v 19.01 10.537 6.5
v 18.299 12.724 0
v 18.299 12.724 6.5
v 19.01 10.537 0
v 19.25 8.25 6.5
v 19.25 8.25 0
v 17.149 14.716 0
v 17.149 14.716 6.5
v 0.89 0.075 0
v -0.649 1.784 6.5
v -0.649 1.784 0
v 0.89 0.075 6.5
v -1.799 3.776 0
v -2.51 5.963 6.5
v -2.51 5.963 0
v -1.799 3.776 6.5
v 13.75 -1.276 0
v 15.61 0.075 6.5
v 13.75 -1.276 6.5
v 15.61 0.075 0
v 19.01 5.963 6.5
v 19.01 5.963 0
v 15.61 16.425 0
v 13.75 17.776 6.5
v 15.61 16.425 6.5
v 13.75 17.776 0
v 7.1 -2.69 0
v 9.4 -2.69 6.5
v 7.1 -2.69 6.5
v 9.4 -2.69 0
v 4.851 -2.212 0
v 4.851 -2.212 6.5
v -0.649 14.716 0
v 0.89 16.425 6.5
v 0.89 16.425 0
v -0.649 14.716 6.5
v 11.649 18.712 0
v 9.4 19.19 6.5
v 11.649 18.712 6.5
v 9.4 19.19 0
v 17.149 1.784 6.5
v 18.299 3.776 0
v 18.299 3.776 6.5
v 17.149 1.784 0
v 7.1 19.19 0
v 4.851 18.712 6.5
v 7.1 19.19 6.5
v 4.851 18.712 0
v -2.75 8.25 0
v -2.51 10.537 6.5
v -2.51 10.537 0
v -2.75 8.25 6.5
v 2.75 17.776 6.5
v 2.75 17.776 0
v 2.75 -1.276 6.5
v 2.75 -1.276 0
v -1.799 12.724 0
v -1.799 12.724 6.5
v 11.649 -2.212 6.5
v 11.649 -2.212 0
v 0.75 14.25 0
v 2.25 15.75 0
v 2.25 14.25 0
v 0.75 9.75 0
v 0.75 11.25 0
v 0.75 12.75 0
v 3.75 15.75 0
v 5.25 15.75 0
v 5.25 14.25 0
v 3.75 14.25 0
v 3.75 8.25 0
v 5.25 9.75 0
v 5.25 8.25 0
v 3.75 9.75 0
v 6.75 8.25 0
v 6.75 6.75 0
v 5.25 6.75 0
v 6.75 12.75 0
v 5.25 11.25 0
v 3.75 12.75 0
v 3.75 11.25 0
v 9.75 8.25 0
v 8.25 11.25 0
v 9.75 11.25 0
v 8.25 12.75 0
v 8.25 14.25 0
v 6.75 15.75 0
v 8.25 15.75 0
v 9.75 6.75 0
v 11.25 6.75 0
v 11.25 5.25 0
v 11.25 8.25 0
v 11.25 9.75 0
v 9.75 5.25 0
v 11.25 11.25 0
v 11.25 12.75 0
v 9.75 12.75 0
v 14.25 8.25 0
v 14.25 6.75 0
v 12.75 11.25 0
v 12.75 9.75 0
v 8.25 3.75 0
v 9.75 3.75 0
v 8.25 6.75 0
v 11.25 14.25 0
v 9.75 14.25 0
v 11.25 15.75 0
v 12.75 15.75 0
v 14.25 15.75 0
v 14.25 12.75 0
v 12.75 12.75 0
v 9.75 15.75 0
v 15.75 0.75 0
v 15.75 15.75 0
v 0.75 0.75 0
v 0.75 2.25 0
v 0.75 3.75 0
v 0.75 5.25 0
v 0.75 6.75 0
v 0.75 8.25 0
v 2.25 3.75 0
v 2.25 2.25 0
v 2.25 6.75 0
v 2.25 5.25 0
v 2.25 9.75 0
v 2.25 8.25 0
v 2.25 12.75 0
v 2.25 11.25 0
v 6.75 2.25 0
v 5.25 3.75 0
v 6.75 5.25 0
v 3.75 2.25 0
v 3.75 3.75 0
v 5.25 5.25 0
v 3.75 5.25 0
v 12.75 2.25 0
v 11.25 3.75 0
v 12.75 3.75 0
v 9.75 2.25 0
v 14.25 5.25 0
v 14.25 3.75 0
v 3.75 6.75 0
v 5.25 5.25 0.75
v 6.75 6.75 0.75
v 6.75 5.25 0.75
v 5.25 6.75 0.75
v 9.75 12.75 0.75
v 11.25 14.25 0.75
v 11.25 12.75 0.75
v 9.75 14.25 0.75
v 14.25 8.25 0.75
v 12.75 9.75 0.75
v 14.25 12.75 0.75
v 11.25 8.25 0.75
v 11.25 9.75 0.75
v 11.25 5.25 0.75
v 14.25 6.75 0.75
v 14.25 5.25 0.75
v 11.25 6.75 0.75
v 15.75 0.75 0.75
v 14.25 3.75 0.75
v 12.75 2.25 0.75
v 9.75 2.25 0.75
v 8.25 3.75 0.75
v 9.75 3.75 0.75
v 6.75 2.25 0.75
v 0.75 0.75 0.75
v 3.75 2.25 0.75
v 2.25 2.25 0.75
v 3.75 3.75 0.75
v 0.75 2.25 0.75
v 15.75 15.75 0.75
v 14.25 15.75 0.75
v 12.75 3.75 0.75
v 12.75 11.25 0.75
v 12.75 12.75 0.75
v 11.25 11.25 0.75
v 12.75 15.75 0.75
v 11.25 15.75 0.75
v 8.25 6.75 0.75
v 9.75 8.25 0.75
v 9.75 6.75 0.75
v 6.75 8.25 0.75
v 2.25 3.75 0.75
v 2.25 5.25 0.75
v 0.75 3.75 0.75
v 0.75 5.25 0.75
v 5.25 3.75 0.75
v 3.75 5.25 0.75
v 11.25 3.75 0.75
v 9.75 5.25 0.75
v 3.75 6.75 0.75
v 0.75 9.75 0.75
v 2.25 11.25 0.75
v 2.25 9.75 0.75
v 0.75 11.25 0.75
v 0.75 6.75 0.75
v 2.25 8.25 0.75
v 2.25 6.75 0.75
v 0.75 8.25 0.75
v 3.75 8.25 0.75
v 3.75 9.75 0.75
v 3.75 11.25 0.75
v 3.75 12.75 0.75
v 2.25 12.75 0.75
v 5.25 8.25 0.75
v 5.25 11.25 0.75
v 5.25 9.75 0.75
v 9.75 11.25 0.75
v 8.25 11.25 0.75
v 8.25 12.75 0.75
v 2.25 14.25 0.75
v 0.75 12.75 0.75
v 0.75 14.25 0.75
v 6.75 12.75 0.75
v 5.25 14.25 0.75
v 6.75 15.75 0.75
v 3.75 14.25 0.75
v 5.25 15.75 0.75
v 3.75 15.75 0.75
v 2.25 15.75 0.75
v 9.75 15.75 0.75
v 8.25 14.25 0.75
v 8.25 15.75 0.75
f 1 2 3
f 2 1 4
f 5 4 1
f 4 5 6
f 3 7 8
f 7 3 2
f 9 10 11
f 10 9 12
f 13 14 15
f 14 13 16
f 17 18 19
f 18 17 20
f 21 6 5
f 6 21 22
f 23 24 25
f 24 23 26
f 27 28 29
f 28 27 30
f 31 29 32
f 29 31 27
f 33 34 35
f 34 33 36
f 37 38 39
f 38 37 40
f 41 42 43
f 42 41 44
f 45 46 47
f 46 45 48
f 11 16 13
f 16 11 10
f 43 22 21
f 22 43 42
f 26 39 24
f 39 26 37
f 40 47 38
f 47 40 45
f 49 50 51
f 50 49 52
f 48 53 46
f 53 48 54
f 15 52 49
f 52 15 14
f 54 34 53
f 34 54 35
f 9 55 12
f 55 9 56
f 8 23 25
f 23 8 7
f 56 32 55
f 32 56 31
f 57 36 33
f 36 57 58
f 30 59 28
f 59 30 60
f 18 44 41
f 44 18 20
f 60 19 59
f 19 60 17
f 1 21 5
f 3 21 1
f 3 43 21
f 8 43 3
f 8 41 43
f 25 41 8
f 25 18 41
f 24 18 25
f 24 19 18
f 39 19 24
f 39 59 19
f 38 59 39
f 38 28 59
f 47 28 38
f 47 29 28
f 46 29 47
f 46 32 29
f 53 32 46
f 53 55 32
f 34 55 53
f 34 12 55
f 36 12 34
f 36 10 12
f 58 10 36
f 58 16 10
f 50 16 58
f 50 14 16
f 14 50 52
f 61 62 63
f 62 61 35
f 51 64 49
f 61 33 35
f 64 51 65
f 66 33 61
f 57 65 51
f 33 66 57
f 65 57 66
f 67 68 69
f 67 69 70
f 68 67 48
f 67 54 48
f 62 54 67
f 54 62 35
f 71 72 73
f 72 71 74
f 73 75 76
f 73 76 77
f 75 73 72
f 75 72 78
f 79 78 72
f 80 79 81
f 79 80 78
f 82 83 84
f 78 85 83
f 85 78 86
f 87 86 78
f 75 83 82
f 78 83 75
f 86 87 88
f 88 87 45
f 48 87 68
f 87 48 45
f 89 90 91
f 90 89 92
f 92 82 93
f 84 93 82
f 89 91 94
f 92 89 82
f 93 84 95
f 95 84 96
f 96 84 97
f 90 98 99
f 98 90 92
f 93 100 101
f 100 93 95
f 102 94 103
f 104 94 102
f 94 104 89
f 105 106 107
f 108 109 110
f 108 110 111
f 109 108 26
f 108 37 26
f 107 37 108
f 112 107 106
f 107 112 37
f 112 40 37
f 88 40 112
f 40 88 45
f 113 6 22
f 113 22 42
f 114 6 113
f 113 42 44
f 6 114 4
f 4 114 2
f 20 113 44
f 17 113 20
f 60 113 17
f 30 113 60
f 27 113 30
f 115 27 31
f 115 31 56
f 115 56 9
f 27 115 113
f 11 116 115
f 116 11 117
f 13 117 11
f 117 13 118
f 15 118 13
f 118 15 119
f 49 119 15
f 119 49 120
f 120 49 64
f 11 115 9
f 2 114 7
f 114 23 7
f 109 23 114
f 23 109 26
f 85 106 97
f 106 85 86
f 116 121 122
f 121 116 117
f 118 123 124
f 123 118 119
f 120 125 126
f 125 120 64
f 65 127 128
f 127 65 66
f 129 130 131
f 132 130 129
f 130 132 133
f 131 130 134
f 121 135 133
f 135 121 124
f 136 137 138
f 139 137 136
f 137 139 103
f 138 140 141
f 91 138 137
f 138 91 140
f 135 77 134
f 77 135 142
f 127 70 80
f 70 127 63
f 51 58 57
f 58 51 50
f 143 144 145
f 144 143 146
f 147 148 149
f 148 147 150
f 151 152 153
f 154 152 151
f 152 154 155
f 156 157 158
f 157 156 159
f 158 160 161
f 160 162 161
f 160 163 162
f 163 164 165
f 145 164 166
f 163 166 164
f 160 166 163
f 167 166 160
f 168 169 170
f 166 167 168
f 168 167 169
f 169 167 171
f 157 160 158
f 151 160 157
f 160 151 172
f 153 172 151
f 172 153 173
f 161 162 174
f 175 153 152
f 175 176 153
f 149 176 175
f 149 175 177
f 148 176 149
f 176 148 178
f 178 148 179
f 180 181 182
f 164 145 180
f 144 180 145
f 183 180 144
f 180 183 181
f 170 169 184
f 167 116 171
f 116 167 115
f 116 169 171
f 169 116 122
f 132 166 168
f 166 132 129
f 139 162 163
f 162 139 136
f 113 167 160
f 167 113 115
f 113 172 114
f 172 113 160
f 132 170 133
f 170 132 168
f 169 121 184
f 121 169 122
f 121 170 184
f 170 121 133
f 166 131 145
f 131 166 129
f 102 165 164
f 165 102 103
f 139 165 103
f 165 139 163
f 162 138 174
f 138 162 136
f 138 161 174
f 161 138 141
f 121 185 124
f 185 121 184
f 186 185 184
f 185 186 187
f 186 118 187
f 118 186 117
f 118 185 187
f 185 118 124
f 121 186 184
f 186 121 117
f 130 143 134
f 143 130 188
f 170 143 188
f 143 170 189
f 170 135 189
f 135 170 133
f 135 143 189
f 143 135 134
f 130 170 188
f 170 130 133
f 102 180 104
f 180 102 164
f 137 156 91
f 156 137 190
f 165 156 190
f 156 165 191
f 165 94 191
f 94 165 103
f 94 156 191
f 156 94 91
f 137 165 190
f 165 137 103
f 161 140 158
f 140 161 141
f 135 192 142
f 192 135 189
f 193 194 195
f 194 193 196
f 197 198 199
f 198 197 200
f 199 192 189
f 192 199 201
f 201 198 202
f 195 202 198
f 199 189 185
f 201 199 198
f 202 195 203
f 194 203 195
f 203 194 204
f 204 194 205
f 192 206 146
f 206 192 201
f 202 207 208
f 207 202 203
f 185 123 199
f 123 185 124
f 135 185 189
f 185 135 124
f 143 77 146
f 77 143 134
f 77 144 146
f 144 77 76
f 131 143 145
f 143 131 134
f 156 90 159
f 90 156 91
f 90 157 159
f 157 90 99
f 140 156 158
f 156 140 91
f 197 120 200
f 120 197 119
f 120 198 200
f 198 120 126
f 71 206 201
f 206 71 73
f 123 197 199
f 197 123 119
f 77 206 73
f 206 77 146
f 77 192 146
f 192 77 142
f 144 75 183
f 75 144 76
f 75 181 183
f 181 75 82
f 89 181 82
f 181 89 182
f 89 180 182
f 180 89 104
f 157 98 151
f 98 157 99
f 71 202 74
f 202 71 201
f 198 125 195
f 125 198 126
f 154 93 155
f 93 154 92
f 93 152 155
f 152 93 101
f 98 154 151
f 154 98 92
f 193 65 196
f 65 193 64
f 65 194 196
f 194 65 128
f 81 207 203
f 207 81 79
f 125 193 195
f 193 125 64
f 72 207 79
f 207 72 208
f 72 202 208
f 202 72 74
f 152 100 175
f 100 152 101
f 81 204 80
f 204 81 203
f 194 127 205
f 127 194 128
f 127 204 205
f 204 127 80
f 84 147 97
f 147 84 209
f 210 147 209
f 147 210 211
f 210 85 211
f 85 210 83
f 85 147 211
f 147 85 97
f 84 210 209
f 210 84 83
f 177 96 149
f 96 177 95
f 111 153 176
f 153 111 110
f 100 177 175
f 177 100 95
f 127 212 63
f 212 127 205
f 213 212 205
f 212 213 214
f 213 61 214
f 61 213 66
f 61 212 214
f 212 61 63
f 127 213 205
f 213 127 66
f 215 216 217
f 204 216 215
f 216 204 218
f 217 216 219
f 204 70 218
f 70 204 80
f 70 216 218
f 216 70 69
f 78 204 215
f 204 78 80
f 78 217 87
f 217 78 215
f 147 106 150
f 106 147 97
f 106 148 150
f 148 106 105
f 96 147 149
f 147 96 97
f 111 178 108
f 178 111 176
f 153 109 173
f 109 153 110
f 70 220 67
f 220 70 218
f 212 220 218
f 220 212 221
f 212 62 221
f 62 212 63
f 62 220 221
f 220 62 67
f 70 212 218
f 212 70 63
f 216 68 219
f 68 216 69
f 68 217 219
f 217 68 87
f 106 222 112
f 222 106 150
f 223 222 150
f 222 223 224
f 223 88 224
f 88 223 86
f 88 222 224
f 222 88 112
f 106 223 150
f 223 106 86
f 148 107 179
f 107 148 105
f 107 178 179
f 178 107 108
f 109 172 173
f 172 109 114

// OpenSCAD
rotate([0,0,0])difference(){translate([8.25,8.25,0])  cylinder(r=11,h=6.5, center=false);
translate([1.5,1.5,0])  cube(size = [1.5,1.5,1.5], center = true);
translate([3,1.5,0])  cube(size = [1.5,1.5,1.5], center = true);
translate([4.5,1.5,0])  cube(size = [1.5,1.5,1.5], center = true);
translate([6,1.5,0])  cube(size = [1.5,1.5,1.5], center = true);
translate([7.5,1.5,0])  cube(size = [1.5,1.5,1.5], center = true);
translate([9,1.5,0])  cube(size = [1.5,1.5,1.5], center = true);
translate([10.5,1.5,0])  cube(size = [1.5,1.5,1.5], center = true);
translate([12,1.5,0])  cube(size = [1.5,1.5,1.5], center = true);
translate([13.5,1.5,0])  cube(size = [1.5,1.5,1.5], center = true);
translate([15,1.5,0])  cube(size = [1.5,1.5,1.5], center = true);
translate([15,1.5,0])  cube(size = [1.5,1.5,1.5], center = true);
translate([3,3,0])  cube(size = [1.5,1.5,1.5], center = true);
translate([3,3,0])  cube(size = [1.5,1.5,1.5], center = true);
translate([3,3,0])  cube(size = [1.5,1.5,1.5], center = true);
translate([7.5,3,0])  cube(size = [1.5,1.5,1.5], center = true);
translate([9,3,0])  cube(size = [1.5,1.5,1.5], center = true);
translate([9,3,0])  cube(size = [1.5,1.5,1.5], center = true);
translate([9,3,0])  cube(size = [1.5,1.5,1.5], center = true);
translate([13.5,3,0])  cube(size = [1.5,1.5,1.5], center = true);
translate([15,3,0])  cube(size = [1.5,1.5,1.5], center = true);
translate([1.5,4.5,0])  cube(size = [1.5,1.5,1.5], center = true);
translate([1.5,4.5,0])  cube(size = [1.5,1.5,1.5], center = true);
translate([4.5,4.5,0])  cube(size = [1.5,1.5,1.5], center = true);
translate([4.5,4.5,0])  cube(size = [1.5,1.5,1.5], center = true);
translate([7.5,4.5,0])  cube(size = [1.5,1.5,1.5], center = true);
translate([7.5,4.5,0])  cube(size = [1.5,1.5,1.5], center = true);
translate([10.5,4.5,0])  cube(size = [1.5,1.5,1.5], center = true);
translate([10.5,4.5,0])  cube(size = [1.5,1.5,1.5], center = true);
translate([10.5,4.5,0])  cube(size = [1.5,1.5,1.5], center = true);
translate([15,4.5,0])  cube(size = [1.5,1.5,1.5], center = true);
translate([15,4.5,0])  cube(size = [1.5,1.5,1.5], center = true);
translate([3,6,0])  cube(size = [1.5,1.5,1.5], center = true);
translate([3,6,0])  cube(size = [1.5,1.5,1.5], center = true);
translate([6,6,0])  cube(size = [1.5,1.5,1.5], center = true);
translate([7.5,6,0])  cube(size = [1.5,1.5,1.5], center = true);
translate([7.5,6,0])  cube(size = [1.5,1.5,1.5], center = true);
translate([7.5,6,0])  cube(size = [1.5,1.5,1.5], center = true);
translate([12,6,0])  cube(size = [1.5,1.5,1.5], center = true);
translate([13.5,6,0])  cube(size = [1.5,1.5,1.5], center = true);
translate([15,6,0])  cube(size = [1.5,1.5,1.5], center = true);
translate([1.5,7.5,0])  cube(size = [1.5,1.5,1.5], center = true);
translate([3,7.5,0])  cube(size = [1.5,1.5,1.5], center = true);
translate([4.5,7.5,0])  cube(size = [1.5,1.5,1.5], center = true);
translate([4.5,7.5,0])  cube(size = [1.5,1.5,1.5], center = true);
translate([7.5,7.5,0])  cube(size = [1.5,1.5,1.5], center = true);
translate([9,7.5,0])  cube(size = [1.5,1.5,1.5], center = true);
translate([9,7.5,0])  cube(size = [1.5,1.5,1.5], center = true);
translate([9,7.5,0])  cube(size = [1.5,1.5,1.5], center = true);
translate([9,7.5,0])  cube(size = [1.5,1.5,1.5], center = true);
translate([15,7.5,0])  cube(size = [1.5,1.5,1.5], center = true);
translate([15,7.5,0])  cube(size = [1.5,1.5,1.5], center = true);
translate([3,9,0])  cube(size = [1.5,1.5,1.5], center = true);
translate([3,9,0])  cube(size = [1.5,1.5,1.5], center = true);
translate([3,9,0])  cube(size = [1.5,1.5,1.5], center = true);
translate([3,9,0])  cube(size = [1.5,1.5,1.5], center = true);
translate([3,9,0])  cube(size = [1.5,1.5,1.5], center = true);
translate([3,9,0])  cube(size = [1.5,1.5,1.5], center = true);
translate([12,9,0])  cube(size = [1.5,1.5,1.5], center = true);
translate([13.5,9,0])  cube(size = [1.5,1.5,1.5], center = true);
translate([15,9,0])  cube(size = [1.5,1.5,1.5], center = true);
translate([1.5,10.5,0])  cube(size = [1.5,1.5,1.5], center = true);
translate([3,10.5,0])  cube(size = [1.5,1.5,1.5], center = true);
translate([4.5,10.5,0])  cube(size = [1.5,1.5,1.5], center = true);
translate([4.5,10.5,0])  cube(size = [1.5,1.5,1.5], center = true);
translate([4.5,10.5,0])  cube(size = [1.5,1.5,1.5], center = true);
translate([4.5,10.5,0])  cube(size = [1.5,1.5,1.5], center = true);
translate([4.5,10.5,0])  cube(size = [1.5,1.5,1.5], center = true);
translate([4.5,10.5,0])  cube(size = [1.5,1.5,1.5], center = true);
translate([13.5,10.5,0])  cube(size = [1.5,1.5,1.5], center = true);
translate([15,10.5,0])  cube(size = [1.5,1.5,1.5], center = true);
translate([15,10.5,0])  cube(size = [1.5,1.5,1.5], center = true);
translate([3,12,0])  cube(size = [1.5,1.5,1.5], center = true);
translate([3,12,0])  cube(size = [1.5,1.5,1.5], center = true);
translate([3,12,0])  cube(size = [1.5,1.5,1.5], center = true);
translate([3,12,0])  cube(size = [1.5,1.5,1.5], center = true);
translate([9,12,0])  cube(size = [1.5,1.5,1.5], center = true);
translate([9,12,0])  cube(size = [1.5,1.5,1.5], center = true);
translate([12,12,0])  cube(size = [1.5,1.5,1.5], center = true);
translate([13.5,12,0])  cube(size = [1.5,1.5,1.5], center = true);
translate([15,12,0])  cube(size = [1.5,1.5,1.5], center = true);
translate([1.5,13.5,0])  cube(size = [1.5,1.5,1.5], center = true);
translate([1.5,13.5,0])  cube(size = [1.5,1.5,1.5], center = true);
translate([4.5,13.5,0])  cube(size = [1.5,1.5,1.5], center = true);
translate([6,13.5,0])  cube(size = [1.5,1.5,1.5], center = true);
translate([6,13.5,0])  cube(size = [1.5,1.5,1.5], center = true);
translate([6,13.5,0])  cube(size = [1.5,1.5,1.5], center = true);
translate([10.5,13.5,0])  cube(size = [1.5,1.5,1.5], center = true);
translate([12,13.5,0])  cube(size = [1.5,1.5,1.5], center = true);
translate([12,13.5,0])  cube(size = [1.5,1.5,1.5], center = true);
translate([15,13.5,0])  cube(size = [1.5,1.5,1.5], center = true);
translate([15,13.5,0])  cube(size = [1.5,1.5,1.5], center = true);
translate([3,15,0])  cube(size = [1.5,1.5,1.5], center = true);
translate([3,15,0])  cube(size = [1.5,1.5,1.5], center = true);
translate([6,15,0])  cube(size = [1.5,1.5,1.5], center = true);
translate([6,15,0])  cube(size = [1.5,1.5,1.5], center = true);
translate([9,15,0])  cube(size = [1.5,1.5,1.5], center = true);
translate([9,15,0])  cube(size = [1.5,1.5,1.5], center = true);
translate([12,15,0])  cube(size = [1.5,1.5,1.5], center = true);
translate([12,15,0])  cube(size = [1.5,1.5,1.5], center = true);
translate([15,15,0])  cube(size = [1.5,1.5,1.5], center = true);
rotate([90,90,0])translate([3.25,13,0])  cylinder(r=1.5,h=400, $fn=60, center = true);
rotate([90,90,0])translate([3.25,3.25,0])  cylinder(r=1.5,h=400, $fn=60, center = true);
}
